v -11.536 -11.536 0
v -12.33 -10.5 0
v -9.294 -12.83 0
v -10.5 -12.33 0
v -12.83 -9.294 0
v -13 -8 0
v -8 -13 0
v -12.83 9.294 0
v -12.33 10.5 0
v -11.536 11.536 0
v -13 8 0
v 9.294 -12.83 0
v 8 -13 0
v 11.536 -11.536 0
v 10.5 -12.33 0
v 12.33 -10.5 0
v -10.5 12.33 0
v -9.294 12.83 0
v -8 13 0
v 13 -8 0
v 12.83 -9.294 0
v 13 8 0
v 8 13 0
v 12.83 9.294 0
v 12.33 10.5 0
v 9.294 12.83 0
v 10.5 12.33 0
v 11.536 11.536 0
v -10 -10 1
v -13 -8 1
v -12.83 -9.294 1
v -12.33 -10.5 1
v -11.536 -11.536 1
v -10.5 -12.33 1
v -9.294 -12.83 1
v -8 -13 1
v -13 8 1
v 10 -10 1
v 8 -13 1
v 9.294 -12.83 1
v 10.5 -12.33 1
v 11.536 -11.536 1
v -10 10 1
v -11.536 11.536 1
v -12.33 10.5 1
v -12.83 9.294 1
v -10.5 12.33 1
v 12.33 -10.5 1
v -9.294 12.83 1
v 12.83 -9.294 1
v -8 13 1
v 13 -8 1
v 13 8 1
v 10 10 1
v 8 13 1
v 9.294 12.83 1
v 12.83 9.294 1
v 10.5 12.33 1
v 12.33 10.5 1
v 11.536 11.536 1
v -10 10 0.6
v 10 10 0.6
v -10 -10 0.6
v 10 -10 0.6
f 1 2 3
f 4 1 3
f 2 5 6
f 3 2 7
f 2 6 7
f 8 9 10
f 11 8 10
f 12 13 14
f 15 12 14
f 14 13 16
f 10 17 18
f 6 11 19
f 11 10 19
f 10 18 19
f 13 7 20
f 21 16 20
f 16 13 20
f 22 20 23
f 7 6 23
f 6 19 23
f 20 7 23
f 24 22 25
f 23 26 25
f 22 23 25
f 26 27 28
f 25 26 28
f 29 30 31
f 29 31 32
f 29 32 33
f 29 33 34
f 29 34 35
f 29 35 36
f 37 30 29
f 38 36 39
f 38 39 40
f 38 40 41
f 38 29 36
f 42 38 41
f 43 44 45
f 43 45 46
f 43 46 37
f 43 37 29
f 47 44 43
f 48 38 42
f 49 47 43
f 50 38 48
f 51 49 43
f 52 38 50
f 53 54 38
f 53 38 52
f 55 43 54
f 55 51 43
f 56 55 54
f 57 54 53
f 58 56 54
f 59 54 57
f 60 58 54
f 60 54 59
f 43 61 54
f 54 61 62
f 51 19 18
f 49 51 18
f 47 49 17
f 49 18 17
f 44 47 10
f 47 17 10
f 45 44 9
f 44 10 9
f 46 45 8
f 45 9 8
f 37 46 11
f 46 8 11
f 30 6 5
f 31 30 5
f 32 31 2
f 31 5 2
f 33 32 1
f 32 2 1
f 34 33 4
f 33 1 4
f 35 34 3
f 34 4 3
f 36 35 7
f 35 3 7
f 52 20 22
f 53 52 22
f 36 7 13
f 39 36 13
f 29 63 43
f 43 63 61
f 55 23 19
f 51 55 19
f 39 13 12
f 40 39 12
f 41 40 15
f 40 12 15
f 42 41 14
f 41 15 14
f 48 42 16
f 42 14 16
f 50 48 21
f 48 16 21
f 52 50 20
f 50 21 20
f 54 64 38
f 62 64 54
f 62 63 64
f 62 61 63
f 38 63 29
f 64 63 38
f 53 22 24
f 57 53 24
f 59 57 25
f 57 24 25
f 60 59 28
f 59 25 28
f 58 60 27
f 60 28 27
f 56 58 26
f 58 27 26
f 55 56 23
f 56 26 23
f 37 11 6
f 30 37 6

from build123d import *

# Parameters (mm, degrees)
F0_W     = 22
F0_H     = 22
F1_DEPTH = 0.6
F2_W     = 20
F2_H     = 20
F3_DEPTH = 1


with BuildPart() as f1:
    # F0 (on Top) → F1 (new body)
    with BuildSketch(Plane.XY):
        Rectangle(F0_W, F0_H)
    extrude(amount=F1_DEPTH)

    # F2 (on Top) → F3 (join)
    with BuildSketch(Plane.XY):
        with BuildLine():
            ThreePointArc((13, 8), (11.535534, 11.535534), (8, 13))
            Line((8, 13), (-8, 13))
            ThreePointArc((-8, 13), (-11.535534, 11.535534), (-13, 8))
            Line((-13, 8), (-13, -8))
            ThreePointArc((-13, -8), (-11.535534, -11.535534), (-8, -13))
            Line((-8, -13), (8, -13))
            ThreePointArc((8, -13), (11.535534, -11.535534), (13, -8))
            Line((13, -8), (13, 8))
        make_face()
        Rectangle(F2_W, F2_H, mode=Mode.SUBTRACT)
    extrude(amount=F3_DEPTH)


solid = f1.part
